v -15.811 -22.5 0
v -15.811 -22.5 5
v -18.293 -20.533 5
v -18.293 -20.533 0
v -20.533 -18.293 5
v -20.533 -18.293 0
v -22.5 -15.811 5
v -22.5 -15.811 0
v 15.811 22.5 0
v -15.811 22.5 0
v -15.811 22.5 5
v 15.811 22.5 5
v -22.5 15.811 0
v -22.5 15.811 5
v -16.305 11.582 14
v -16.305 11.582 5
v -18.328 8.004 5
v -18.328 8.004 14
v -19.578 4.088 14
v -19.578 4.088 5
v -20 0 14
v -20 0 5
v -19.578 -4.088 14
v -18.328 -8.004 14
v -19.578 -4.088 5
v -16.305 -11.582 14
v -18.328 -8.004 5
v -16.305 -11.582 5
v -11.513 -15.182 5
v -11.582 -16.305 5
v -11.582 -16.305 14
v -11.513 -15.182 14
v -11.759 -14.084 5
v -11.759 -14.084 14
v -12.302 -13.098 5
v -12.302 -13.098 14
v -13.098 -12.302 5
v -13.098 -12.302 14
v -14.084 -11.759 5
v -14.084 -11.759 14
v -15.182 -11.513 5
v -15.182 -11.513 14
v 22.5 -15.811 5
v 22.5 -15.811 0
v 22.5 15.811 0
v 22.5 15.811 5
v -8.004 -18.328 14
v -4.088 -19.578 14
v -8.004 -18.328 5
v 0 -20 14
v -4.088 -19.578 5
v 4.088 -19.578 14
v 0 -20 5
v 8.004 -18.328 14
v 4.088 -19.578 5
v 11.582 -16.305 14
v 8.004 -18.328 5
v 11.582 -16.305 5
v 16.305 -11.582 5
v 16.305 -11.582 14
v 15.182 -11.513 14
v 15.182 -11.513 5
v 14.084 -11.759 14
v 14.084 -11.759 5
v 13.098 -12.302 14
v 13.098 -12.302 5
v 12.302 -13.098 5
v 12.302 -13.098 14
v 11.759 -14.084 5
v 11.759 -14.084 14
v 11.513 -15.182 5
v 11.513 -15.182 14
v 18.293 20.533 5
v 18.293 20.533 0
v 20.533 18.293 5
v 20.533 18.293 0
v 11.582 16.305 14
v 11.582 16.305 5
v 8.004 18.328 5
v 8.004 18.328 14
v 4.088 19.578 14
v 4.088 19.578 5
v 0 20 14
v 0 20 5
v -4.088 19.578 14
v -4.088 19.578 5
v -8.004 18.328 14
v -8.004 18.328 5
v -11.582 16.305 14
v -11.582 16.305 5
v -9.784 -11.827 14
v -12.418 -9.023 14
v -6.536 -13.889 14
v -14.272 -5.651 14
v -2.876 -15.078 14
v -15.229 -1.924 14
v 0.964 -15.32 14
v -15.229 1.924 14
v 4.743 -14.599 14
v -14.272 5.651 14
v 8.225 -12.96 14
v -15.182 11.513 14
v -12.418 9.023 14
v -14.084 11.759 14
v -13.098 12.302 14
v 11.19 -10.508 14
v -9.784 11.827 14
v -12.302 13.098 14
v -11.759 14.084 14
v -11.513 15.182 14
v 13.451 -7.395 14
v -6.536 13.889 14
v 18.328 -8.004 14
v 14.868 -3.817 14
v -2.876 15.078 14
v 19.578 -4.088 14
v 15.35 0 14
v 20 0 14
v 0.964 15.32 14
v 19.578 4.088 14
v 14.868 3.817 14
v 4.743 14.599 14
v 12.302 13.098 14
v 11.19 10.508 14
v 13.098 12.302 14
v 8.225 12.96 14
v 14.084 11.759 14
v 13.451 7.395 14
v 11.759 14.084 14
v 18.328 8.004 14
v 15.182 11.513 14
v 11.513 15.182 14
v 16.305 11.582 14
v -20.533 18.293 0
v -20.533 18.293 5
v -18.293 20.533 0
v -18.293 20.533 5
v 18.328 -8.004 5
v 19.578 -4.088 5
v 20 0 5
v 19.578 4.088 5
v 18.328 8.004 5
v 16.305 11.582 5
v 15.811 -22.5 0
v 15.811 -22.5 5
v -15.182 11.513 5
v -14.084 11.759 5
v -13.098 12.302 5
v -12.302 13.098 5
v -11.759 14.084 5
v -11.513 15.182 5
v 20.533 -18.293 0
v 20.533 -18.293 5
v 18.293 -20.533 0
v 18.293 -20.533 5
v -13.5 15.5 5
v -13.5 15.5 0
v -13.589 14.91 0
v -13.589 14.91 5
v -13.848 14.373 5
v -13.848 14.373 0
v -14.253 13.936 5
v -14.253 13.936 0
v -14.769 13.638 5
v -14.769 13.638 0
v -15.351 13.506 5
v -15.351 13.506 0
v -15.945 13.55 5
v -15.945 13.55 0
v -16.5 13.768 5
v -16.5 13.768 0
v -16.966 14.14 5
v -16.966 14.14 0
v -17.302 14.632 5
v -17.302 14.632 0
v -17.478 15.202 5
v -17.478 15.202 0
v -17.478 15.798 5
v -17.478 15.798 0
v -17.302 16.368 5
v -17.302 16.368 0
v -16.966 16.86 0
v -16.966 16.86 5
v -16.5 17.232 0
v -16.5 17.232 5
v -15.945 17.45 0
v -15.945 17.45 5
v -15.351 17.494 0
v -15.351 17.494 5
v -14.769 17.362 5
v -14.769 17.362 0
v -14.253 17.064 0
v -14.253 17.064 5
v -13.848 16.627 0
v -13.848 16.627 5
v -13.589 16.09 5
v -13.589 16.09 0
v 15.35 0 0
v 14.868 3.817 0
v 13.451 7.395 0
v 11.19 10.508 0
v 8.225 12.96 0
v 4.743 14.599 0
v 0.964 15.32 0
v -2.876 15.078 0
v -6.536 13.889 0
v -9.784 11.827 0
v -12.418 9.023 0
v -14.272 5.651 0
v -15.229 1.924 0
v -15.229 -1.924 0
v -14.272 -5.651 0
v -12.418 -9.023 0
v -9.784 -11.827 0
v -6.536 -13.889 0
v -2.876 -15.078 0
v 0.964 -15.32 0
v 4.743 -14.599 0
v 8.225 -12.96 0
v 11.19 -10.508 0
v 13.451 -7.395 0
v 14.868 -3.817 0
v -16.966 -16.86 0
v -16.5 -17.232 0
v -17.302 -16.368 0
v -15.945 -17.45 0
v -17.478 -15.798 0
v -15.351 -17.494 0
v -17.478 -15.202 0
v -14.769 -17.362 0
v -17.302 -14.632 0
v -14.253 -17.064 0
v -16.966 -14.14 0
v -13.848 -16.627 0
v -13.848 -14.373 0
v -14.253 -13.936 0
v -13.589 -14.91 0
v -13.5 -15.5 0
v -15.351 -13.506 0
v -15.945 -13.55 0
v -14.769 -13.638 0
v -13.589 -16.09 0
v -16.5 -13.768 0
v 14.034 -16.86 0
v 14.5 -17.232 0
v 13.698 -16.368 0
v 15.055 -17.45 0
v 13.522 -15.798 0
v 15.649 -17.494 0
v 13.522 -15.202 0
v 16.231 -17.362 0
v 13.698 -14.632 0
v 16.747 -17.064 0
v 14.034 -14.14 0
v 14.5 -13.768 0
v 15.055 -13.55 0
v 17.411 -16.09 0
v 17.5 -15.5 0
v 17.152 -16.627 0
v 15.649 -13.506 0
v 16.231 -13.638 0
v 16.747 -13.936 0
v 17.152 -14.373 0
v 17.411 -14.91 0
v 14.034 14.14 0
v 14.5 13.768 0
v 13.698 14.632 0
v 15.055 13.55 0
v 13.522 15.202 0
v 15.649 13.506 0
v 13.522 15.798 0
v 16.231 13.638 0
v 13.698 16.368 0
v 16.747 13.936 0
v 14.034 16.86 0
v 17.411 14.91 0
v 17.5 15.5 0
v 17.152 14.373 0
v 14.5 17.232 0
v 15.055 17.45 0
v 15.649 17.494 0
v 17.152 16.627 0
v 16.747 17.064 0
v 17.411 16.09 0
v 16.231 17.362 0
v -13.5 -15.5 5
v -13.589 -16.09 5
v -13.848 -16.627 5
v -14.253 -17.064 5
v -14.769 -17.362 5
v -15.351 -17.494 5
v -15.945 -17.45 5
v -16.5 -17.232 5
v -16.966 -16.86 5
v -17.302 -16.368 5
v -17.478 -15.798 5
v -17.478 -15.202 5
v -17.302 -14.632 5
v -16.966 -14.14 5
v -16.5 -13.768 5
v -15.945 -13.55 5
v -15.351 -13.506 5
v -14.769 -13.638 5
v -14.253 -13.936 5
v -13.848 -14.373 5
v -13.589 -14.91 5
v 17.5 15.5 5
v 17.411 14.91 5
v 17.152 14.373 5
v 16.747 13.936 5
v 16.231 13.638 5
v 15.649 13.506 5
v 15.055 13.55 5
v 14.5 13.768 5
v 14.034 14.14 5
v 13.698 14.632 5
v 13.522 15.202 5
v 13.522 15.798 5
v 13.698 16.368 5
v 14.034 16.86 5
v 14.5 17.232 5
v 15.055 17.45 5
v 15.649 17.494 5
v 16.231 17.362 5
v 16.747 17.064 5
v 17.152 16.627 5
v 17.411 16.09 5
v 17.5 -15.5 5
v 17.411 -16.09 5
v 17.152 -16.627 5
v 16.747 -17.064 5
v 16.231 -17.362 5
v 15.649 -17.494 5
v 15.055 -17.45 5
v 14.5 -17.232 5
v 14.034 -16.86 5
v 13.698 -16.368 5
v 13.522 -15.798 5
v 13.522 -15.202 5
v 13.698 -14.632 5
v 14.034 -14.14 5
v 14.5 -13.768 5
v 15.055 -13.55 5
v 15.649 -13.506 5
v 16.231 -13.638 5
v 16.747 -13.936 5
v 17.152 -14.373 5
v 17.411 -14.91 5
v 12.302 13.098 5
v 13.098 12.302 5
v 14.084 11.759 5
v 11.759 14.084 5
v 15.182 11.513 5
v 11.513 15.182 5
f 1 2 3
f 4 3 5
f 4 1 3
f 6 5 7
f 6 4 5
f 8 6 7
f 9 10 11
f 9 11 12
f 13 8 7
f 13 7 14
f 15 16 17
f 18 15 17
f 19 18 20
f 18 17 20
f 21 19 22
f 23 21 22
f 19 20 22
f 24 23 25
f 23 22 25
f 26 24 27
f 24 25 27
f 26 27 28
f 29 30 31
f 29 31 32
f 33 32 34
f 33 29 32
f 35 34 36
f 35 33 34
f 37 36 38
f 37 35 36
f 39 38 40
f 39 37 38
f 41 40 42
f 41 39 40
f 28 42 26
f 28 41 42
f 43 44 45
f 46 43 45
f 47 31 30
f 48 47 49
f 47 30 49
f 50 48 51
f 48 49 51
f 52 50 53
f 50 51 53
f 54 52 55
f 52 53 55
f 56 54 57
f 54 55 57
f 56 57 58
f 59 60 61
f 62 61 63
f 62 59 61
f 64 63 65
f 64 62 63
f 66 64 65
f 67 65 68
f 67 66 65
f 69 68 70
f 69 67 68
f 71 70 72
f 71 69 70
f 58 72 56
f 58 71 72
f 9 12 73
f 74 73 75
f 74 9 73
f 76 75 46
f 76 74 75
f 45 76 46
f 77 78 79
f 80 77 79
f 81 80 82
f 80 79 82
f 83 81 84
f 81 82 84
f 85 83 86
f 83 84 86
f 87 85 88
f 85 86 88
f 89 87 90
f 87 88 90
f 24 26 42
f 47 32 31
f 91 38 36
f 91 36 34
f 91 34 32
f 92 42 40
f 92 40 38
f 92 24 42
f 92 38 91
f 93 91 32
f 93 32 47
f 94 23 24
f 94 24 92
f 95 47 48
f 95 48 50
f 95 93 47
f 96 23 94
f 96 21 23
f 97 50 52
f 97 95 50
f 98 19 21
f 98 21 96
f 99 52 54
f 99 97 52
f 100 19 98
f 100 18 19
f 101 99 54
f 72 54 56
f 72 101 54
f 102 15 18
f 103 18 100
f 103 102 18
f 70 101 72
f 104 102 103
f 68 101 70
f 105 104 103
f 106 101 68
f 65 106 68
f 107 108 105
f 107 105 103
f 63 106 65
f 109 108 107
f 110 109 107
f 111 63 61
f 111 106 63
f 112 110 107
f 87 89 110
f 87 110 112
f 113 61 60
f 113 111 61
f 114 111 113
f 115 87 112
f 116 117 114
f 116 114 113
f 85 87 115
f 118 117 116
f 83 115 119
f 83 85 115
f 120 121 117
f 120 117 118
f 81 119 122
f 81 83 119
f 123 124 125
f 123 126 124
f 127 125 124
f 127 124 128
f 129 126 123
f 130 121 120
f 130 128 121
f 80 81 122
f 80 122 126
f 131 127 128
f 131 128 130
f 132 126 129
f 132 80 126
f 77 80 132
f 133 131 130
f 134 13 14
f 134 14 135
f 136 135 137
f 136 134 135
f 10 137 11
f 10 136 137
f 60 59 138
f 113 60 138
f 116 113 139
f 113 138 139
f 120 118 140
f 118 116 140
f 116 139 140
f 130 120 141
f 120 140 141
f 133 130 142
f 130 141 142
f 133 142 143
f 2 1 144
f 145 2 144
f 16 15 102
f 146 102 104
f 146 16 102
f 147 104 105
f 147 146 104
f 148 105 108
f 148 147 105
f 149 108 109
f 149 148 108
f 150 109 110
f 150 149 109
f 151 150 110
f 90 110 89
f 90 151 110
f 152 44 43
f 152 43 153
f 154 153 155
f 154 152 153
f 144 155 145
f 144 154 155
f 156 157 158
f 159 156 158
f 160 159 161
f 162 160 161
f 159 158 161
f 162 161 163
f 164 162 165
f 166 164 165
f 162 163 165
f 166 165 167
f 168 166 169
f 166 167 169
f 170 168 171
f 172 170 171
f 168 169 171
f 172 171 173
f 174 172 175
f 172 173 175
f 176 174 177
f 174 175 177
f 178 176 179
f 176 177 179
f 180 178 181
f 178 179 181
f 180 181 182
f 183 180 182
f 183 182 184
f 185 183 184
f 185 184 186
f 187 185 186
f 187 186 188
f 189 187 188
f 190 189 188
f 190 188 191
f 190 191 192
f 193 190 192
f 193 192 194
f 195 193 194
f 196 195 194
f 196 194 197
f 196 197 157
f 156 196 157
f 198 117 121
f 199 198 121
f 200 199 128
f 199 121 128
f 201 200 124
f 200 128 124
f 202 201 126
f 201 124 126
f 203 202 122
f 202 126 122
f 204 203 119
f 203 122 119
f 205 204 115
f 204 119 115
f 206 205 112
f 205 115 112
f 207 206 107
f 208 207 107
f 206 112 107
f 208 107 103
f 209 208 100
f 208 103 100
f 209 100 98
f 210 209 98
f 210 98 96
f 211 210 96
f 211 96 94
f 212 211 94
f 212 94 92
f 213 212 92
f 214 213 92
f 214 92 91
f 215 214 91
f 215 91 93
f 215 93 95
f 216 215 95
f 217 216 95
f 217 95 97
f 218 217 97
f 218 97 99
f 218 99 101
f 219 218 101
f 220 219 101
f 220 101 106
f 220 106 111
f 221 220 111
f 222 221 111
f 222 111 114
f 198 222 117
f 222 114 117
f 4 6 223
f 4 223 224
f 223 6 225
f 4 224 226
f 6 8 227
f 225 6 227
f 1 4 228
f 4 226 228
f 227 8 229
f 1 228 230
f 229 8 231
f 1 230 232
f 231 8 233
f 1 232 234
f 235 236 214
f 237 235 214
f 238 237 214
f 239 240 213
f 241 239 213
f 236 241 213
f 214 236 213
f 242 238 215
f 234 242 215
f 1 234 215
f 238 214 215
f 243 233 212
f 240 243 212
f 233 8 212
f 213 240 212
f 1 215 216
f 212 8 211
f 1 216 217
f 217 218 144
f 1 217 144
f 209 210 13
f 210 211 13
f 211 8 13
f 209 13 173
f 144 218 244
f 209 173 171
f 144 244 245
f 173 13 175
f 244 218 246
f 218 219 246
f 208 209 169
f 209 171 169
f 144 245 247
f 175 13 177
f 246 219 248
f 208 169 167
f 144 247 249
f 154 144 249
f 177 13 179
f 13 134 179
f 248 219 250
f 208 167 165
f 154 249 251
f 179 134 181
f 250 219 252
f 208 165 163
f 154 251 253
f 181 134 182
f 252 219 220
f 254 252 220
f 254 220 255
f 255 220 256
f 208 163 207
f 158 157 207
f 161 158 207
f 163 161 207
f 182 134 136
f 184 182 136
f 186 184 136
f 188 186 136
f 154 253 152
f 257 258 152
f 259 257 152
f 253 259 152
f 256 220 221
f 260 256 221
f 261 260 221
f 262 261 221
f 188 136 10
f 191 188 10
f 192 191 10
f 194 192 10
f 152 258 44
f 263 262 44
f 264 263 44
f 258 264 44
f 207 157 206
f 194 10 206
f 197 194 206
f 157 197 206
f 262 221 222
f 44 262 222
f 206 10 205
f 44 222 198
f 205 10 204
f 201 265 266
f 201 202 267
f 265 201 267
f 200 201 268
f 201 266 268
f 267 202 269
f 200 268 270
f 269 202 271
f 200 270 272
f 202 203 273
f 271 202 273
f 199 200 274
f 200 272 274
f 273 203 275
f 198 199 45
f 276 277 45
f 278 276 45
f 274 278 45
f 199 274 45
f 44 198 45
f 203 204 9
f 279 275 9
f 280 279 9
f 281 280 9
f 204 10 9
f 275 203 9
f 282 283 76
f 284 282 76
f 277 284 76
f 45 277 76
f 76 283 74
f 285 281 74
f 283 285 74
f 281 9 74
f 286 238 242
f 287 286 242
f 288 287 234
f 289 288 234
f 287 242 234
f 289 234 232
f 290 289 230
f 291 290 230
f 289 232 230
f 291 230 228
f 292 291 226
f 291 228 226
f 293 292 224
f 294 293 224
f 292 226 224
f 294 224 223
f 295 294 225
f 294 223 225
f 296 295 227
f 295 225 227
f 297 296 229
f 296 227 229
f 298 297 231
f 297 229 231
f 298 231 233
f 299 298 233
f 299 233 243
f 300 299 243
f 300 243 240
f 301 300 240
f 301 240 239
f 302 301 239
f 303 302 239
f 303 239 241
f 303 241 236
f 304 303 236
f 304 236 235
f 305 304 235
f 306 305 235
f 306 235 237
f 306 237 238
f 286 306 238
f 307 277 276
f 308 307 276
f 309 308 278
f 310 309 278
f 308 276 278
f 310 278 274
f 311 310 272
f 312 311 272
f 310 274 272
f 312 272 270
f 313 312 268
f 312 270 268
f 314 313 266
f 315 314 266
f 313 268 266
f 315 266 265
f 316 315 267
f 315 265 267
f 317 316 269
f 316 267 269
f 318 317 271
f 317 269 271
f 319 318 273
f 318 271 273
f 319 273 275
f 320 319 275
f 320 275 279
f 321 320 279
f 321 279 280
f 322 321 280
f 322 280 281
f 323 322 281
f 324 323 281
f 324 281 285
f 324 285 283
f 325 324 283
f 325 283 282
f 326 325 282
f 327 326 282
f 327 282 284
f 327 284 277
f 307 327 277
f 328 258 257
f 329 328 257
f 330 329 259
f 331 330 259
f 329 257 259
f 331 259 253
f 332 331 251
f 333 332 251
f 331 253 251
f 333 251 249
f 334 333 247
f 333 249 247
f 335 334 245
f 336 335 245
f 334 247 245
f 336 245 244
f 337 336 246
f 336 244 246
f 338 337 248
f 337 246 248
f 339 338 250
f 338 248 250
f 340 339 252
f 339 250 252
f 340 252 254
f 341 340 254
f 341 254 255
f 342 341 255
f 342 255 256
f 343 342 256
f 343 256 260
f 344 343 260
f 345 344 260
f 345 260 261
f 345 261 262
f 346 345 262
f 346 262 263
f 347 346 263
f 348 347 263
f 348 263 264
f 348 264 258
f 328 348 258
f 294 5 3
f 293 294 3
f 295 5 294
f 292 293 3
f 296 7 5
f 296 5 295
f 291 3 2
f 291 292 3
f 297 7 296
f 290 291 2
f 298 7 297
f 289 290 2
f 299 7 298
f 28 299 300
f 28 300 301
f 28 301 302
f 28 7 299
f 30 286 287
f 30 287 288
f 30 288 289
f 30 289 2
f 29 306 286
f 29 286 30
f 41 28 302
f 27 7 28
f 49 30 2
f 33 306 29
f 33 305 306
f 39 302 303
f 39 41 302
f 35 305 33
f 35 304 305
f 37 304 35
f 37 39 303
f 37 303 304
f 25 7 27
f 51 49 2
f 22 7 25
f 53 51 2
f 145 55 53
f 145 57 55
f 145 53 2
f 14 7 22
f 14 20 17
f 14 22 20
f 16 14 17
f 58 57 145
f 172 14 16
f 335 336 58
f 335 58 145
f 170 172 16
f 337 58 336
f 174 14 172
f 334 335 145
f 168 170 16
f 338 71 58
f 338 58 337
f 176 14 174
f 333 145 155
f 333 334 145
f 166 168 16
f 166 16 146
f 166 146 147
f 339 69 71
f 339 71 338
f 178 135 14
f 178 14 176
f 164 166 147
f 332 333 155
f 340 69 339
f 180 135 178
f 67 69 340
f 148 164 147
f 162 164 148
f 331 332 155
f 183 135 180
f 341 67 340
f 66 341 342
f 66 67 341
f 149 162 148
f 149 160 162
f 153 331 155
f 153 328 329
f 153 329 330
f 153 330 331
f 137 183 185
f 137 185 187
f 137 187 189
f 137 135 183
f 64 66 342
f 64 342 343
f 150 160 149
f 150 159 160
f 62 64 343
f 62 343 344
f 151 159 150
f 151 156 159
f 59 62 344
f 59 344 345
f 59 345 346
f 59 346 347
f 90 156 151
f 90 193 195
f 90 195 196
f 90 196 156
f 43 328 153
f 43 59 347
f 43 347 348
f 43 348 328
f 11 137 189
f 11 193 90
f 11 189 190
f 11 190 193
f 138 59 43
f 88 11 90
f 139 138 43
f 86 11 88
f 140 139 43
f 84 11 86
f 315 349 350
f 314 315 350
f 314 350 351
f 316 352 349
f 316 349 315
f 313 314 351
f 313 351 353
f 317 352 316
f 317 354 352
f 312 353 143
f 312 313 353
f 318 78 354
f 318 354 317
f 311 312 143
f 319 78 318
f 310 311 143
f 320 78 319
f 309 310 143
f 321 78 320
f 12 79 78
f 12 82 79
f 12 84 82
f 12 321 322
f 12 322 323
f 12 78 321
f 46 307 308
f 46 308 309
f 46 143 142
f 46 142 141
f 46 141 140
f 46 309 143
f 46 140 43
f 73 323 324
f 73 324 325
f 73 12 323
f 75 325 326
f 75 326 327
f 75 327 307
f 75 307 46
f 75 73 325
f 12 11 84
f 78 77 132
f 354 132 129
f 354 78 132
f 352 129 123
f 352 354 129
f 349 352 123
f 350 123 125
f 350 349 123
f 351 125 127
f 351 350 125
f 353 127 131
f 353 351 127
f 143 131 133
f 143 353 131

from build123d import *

# Parameters (mm, degrees)
F0_W      = 45
F0_H      = 45
F1_DEPTH  = 5
F2_R      = 20
F3_DEPTH  = 9
F4_R      = 2
F5_DEPTH  = 25
F6_R      = 4
F7_DEPTH  = 25
F8_R      = 15.35
F9_DEPTH  = 25
F10_R     = 45.141628
F10_R_2   = 27.5
F11_DEPTH = 25


with BuildPart() as f1:
    # F0 (on Top) → F1 (new body)
    with BuildSketch(Plane.XY):
        Rectangle(F0_W, F0_H)
    extrude(amount=F1_DEPTH)

    # F2 (on face) → F3 (join)
    with BuildSketch(Plane.XY.offset(5)):
        Circle(F2_R)
    extrude(amount=F3_DEPTH)

    # F4 (on face) → F5 (cut)
    with BuildSketch(Plane(origin=(0, 0, 0), x_dir=(1, 0, 0), z_dir=(0, 0, -1))):
        with Locations((-15.5, 15.5)):
            Circle(F4_R)
        with Locations((-15.5, -15.5)):
            Circle(F4_R)
        with Locations((15.5, 15.5)):
            Circle(F4_R)
        with Locations((15.5, -15.5)):
            Circle(F4_R)
    extrude(amount=-F5_DEPTH, mode=Mode.SUBTRACT)

    # F6 (on face) → F7 (cut)
    with BuildSketch(Plane.XY.offset(5)):
        with Locations((15.5, -15.5)):
            Circle(F6_R)
        with Locations((-15.5, -15.5)):
            Circle(F6_R)
        with Locations((15.5, 15.5)):
            Circle(F6_R)
        with Locations((-15.5, 15.5)):
            Circle(F6_R)
    extrude(amount=F7_DEPTH, mode=Mode.SUBTRACT)

    # F8 (on face) → F9 (cut)
    with BuildSketch(Plane.XY.offset(14)):
        Circle(F8_R)
    extrude(amount=-F9_DEPTH, mode=Mode.SUBTRACT)

    # F10 (on face) → F11 (cut)
    with BuildSketch(Plane(origin=(0, 0, 0), x_dir=(1, 0, 0), z_dir=(0, 0, -1))):
        Circle(F10_R)
        Circle(F10_R_2, mode=Mode.SUBTRACT)
    extrude(amount=-F11_DEPTH, mode=Mode.SUBTRACT)


solid = f1.part
